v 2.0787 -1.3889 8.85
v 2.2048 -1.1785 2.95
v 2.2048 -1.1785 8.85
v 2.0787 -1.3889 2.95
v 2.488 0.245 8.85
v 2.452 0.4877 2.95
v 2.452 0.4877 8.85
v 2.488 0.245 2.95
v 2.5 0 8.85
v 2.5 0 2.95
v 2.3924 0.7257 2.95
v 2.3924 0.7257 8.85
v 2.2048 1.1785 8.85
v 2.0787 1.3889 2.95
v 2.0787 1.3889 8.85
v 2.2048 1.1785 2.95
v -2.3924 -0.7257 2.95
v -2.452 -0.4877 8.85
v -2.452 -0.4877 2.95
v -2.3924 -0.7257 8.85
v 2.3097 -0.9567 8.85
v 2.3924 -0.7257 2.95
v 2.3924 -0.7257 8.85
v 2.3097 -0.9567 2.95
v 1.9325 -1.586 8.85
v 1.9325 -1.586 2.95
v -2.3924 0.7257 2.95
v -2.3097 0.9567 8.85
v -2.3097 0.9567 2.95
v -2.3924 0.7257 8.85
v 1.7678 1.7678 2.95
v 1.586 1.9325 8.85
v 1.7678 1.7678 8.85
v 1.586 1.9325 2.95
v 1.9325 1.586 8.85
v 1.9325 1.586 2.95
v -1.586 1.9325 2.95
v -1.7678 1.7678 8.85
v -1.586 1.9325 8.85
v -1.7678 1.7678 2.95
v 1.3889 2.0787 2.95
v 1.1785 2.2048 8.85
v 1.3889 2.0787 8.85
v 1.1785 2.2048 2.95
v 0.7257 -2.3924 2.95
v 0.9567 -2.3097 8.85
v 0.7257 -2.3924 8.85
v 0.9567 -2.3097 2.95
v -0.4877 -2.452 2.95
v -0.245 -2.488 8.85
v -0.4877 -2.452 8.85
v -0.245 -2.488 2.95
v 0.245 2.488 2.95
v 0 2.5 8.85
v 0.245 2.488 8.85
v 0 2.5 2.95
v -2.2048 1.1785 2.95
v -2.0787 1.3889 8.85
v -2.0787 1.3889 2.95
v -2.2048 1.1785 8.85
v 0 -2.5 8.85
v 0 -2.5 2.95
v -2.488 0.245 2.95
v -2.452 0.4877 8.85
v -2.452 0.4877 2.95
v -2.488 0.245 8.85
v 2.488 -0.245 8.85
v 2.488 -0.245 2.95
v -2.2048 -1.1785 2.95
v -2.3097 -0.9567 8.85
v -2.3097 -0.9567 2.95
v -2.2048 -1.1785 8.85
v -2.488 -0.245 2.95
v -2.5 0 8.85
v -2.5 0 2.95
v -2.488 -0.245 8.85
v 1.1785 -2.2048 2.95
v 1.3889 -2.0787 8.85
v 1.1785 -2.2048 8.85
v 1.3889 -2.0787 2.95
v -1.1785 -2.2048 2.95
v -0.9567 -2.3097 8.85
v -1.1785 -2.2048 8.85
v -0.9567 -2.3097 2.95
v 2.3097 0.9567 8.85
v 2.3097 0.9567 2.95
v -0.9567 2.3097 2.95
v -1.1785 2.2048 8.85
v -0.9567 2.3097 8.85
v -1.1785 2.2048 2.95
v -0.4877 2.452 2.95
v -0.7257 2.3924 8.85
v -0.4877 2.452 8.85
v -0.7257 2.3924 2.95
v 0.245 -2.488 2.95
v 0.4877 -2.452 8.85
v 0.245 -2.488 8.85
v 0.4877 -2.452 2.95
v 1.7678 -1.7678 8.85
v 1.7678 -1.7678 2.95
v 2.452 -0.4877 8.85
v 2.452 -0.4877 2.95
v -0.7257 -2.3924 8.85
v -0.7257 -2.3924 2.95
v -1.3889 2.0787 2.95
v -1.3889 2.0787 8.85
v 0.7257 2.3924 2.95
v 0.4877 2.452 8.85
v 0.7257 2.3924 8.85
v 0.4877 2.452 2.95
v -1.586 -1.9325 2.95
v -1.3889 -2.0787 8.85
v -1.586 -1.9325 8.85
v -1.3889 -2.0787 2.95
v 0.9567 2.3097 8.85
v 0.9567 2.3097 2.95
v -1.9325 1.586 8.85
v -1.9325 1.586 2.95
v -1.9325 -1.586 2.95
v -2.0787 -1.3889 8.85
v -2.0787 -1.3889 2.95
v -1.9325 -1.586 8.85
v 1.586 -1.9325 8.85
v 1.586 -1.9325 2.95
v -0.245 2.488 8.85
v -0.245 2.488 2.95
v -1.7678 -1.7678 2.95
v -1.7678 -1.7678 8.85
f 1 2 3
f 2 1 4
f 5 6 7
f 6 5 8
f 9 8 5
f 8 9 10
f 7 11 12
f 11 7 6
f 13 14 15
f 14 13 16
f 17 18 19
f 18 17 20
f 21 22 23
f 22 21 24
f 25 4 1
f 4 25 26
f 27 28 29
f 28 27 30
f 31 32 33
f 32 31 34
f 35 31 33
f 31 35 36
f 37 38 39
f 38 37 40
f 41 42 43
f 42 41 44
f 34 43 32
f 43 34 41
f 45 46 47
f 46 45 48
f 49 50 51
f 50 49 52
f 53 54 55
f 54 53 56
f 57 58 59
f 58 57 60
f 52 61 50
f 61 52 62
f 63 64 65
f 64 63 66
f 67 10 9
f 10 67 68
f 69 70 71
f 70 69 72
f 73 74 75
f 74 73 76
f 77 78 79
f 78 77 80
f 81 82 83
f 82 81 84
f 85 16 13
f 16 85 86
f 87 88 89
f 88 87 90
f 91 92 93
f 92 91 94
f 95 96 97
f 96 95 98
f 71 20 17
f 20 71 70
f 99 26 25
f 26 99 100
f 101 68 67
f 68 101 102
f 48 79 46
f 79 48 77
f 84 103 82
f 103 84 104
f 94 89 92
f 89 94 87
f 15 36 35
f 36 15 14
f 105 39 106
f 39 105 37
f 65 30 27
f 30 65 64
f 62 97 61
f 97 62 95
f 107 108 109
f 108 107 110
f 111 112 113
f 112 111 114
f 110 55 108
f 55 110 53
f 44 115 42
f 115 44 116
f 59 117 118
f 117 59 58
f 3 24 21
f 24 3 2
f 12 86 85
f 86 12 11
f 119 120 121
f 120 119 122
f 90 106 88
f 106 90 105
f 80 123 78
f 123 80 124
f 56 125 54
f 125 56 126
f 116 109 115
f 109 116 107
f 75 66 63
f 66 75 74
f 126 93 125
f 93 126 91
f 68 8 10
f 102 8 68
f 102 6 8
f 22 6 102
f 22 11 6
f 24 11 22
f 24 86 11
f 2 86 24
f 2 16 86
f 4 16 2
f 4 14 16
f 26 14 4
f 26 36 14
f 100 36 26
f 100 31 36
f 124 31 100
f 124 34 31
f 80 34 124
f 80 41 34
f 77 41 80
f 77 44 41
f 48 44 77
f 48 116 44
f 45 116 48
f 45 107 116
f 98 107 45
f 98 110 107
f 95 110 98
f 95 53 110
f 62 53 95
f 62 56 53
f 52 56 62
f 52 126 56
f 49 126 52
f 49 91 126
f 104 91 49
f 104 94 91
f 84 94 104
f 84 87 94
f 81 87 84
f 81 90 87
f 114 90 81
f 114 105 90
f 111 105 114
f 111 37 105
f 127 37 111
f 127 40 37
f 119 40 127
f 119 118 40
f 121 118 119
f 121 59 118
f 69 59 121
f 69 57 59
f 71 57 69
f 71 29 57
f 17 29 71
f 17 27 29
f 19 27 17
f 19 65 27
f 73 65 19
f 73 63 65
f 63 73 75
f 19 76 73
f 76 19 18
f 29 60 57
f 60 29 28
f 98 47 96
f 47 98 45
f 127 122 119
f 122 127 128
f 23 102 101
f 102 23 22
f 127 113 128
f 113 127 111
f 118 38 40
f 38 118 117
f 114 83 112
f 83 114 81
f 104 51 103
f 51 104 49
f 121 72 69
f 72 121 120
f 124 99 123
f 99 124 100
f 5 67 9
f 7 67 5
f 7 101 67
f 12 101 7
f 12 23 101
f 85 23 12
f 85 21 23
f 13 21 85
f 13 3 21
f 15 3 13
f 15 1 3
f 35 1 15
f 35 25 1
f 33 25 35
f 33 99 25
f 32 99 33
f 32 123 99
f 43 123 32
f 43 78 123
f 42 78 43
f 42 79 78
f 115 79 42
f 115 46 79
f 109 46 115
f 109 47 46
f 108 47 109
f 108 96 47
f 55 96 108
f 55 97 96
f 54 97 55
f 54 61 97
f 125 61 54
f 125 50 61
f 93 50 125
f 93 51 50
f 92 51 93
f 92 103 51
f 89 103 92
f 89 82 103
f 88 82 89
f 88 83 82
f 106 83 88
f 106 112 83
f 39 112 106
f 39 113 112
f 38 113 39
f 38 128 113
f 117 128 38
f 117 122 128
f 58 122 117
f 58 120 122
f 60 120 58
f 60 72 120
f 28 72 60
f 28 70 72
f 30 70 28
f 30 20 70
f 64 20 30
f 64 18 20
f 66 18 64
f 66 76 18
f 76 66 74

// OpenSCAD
module led() {
    union() {
        // LED body
        translate([0, 0, 2.95])
            cylinder(h=5.9, d=5.0, $fn=64);
        
        // LED dome
        translate([0, 0, 5.9])
            sphere(d=5.0, $fn=64);
    }
}

led();
